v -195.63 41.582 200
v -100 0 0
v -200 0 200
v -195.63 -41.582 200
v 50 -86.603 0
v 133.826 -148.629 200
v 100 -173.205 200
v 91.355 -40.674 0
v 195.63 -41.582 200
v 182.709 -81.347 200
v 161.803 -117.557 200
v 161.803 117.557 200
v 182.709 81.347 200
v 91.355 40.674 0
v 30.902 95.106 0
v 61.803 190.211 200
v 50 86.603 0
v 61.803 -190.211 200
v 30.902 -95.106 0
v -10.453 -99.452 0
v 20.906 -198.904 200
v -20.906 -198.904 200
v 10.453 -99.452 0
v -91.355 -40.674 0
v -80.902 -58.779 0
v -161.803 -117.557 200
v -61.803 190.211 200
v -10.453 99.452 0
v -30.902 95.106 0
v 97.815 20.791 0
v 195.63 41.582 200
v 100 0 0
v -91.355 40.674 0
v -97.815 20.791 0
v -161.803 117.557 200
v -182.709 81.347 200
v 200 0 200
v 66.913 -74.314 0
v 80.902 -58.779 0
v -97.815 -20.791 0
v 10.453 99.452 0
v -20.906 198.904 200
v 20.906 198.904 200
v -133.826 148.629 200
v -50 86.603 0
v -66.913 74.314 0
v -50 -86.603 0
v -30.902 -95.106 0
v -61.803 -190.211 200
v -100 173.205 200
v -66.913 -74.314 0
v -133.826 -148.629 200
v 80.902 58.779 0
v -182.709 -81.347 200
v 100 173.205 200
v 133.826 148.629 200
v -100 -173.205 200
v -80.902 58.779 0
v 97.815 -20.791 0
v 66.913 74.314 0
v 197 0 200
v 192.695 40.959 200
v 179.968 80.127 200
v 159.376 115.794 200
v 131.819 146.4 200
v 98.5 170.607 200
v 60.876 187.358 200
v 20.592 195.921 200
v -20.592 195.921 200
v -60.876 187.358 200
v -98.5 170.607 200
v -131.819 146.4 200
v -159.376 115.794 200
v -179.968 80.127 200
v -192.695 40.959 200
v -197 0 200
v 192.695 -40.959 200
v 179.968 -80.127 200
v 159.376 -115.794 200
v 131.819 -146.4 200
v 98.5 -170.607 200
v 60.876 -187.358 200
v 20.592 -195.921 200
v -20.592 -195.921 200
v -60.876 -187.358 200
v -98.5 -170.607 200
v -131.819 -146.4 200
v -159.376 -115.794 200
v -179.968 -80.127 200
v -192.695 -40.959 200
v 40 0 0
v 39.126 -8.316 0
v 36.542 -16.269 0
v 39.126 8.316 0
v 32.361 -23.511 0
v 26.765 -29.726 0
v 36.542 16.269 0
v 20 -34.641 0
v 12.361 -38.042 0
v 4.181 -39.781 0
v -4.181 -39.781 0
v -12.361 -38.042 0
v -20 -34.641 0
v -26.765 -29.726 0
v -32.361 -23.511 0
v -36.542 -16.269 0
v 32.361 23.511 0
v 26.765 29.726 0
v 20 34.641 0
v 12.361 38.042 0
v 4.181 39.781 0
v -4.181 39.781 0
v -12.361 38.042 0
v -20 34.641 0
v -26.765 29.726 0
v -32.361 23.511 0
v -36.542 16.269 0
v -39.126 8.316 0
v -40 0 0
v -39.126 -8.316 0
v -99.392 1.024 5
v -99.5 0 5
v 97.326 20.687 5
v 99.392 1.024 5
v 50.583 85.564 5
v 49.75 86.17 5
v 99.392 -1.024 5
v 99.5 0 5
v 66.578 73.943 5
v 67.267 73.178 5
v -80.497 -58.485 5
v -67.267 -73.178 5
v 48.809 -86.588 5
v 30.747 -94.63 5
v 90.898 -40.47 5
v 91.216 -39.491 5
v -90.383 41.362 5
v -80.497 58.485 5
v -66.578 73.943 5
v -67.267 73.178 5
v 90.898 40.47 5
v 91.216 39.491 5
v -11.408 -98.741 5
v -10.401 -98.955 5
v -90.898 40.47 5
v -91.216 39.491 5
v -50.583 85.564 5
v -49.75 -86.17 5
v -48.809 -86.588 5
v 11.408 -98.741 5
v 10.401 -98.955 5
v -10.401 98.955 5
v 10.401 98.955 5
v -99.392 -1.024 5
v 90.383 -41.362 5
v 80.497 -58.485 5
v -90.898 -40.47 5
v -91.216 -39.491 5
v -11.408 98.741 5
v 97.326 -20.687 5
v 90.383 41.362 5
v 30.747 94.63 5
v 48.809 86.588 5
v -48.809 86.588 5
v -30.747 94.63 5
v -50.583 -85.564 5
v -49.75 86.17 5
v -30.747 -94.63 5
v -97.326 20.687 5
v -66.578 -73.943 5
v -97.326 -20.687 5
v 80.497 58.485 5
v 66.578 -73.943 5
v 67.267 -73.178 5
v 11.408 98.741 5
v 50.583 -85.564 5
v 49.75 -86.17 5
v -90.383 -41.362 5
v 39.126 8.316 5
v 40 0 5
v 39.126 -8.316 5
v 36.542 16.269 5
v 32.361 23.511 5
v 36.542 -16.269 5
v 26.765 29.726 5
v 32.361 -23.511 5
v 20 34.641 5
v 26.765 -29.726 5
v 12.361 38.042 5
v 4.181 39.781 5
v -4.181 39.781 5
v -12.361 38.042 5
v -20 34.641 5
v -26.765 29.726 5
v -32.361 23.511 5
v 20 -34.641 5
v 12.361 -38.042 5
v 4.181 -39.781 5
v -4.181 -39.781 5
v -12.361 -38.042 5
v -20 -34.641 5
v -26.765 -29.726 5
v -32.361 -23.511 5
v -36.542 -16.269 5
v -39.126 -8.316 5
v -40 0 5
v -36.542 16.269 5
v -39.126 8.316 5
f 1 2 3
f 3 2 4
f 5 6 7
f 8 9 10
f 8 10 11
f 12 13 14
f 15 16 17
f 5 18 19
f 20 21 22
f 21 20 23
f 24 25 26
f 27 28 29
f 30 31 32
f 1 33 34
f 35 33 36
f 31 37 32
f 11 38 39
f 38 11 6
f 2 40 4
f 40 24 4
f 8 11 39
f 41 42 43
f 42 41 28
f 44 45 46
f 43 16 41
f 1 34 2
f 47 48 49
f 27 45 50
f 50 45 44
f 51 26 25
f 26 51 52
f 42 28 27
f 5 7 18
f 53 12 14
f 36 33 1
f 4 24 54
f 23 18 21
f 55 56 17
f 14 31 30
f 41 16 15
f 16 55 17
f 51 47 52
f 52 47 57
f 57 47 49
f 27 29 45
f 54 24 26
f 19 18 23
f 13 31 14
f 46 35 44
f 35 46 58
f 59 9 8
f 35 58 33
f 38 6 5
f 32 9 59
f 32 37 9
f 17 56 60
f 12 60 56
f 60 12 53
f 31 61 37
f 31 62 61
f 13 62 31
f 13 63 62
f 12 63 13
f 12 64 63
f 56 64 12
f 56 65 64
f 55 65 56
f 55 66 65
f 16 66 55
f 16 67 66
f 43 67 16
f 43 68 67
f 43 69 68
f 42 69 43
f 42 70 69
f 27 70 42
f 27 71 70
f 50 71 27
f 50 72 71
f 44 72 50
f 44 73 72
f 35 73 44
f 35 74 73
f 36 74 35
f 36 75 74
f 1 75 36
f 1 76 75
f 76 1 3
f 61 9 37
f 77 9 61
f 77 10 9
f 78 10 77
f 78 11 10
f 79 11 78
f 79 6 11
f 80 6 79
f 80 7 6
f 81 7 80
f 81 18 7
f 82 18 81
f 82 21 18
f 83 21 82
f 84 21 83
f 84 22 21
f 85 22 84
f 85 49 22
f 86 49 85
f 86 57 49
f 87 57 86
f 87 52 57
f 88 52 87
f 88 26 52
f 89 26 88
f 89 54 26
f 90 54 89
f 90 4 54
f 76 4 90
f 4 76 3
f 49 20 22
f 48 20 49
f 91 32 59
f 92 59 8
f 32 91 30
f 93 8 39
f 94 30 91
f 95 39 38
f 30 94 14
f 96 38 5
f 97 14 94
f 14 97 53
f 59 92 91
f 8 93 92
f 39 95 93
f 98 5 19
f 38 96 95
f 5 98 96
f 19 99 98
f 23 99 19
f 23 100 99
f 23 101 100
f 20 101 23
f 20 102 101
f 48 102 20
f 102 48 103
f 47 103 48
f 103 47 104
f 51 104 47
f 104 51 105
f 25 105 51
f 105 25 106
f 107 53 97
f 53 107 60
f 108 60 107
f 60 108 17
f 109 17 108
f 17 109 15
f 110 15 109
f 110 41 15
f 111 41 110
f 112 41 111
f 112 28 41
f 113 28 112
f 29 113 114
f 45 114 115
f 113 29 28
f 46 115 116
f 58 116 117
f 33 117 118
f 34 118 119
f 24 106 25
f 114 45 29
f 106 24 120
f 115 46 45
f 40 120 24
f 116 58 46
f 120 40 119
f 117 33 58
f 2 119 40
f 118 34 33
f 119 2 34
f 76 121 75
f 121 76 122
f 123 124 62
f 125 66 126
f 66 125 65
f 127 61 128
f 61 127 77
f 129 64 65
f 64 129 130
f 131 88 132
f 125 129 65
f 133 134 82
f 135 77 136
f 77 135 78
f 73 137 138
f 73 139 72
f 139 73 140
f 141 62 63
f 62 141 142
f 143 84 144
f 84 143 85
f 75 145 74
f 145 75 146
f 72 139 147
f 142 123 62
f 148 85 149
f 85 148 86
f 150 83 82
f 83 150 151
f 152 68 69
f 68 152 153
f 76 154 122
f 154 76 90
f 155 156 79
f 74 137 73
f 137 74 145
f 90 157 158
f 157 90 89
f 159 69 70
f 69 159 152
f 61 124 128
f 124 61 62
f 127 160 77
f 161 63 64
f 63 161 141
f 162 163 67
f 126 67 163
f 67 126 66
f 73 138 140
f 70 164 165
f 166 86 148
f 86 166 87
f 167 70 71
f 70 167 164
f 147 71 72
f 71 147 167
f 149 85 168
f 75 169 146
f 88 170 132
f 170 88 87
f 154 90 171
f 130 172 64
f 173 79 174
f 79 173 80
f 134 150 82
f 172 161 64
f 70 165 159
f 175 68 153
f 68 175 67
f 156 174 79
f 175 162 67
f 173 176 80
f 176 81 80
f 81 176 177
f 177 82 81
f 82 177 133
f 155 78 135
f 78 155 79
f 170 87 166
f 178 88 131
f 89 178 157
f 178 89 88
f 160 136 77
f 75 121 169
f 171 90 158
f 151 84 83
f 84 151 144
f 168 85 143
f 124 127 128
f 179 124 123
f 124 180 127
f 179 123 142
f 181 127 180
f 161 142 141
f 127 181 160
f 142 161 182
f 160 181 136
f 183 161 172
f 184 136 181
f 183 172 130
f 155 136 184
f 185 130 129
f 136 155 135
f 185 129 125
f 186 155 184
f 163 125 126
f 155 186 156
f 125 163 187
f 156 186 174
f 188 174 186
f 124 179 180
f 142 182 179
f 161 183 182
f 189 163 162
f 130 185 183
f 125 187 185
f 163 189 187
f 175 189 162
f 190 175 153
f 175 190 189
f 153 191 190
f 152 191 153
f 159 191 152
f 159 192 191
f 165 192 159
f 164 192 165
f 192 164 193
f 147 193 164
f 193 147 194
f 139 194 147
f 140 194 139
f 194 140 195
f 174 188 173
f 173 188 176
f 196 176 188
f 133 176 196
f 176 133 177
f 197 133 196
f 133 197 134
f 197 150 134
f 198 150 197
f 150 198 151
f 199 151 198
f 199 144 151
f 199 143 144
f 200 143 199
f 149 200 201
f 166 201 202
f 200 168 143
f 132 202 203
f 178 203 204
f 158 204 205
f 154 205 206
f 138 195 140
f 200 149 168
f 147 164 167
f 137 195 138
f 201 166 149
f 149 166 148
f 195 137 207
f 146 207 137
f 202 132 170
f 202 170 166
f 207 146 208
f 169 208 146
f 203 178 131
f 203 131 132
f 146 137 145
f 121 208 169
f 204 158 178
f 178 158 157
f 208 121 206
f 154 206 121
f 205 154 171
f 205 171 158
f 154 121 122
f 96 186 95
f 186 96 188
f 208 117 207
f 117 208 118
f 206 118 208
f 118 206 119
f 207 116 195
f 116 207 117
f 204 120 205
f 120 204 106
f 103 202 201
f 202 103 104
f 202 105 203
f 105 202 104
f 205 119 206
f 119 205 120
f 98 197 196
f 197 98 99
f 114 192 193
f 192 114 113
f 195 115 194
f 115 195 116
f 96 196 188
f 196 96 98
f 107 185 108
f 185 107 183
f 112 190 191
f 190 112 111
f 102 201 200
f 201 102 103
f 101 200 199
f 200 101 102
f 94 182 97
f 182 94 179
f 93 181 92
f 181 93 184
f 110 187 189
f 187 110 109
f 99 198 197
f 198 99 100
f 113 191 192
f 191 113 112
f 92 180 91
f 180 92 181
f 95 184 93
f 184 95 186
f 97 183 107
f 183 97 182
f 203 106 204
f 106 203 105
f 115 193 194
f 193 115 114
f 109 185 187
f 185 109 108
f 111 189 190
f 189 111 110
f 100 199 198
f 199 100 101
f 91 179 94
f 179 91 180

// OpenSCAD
//bulb shade
H=200;    //shade height
bd=200;   //bottom diameter
td=100;   //top diameter
sd=40;   //support diameter
th=3;    //shade thickness
module lampshade(){
    rotate([0,180,0]){
        translate([0,0,-H]){
    difference(){
    cylinder(h=H,r1=bd,r2=td);
        cylinder(h=H, r1=bd-th,r2=td-th);
    }
    //top support
    translate([0,0,195])
    difference(){  
        cylinder(h=5,r=td);
        cylinder(h=5,r=40);
    }}
}}
lampshade();
